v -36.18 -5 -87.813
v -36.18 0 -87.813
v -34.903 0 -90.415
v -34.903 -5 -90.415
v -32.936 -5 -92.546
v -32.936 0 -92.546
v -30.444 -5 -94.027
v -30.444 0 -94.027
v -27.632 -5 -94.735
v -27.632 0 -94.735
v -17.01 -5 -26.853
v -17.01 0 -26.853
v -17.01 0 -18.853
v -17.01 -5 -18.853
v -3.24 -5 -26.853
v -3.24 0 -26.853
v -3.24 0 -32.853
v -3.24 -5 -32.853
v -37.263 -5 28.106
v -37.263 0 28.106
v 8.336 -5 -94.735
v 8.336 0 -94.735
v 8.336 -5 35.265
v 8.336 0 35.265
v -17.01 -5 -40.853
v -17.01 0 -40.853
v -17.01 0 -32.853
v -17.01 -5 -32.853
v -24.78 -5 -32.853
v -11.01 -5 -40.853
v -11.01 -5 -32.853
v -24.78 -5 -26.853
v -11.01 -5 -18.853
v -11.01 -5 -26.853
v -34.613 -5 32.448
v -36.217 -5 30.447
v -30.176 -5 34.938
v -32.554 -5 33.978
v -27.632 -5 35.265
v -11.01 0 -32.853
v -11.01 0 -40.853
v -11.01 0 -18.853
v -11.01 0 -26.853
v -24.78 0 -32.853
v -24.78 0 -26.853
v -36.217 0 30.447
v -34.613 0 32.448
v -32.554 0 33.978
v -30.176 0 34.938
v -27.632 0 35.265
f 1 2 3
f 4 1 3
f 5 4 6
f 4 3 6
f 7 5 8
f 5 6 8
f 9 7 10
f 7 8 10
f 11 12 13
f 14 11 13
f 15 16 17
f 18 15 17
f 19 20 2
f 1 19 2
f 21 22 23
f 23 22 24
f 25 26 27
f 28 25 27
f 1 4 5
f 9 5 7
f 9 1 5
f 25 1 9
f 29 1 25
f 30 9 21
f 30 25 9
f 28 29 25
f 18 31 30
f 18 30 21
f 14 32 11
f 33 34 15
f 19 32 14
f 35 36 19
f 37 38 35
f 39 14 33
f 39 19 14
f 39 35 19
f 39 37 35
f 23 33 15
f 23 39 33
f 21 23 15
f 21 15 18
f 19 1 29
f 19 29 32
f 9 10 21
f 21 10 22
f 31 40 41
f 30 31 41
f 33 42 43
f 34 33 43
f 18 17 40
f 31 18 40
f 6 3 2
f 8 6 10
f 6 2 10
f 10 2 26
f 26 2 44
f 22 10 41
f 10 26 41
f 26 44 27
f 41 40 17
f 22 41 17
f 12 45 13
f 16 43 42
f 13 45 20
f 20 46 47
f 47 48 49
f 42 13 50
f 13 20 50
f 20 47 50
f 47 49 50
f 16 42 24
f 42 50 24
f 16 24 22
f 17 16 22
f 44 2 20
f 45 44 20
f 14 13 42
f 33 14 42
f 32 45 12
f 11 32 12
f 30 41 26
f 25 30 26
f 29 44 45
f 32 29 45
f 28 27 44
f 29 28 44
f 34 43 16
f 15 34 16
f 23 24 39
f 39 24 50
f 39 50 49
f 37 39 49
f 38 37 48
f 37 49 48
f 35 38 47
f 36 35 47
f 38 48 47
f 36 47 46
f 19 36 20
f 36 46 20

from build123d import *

# Parameters (mm, degrees)
F1_DEPTH = 5


with BuildPart() as f1:
    # F0 (on Front) → F1 (new body)
    with BuildSketch(Plane.XZ):
        with BuildLine():
            Line((8.335973, -94.735098), (8.335973, 35.264902))
            Line((8.335973, 35.264902), (-27.632447, 35.264902))
            ThreePointArc((-27.632447, 35.264902), (-33.632447, 33.279139), (-37.263132, 28.105998))
            Line((-37.263132, 28.105998), (-36.180024, -87.812574))
            ThreePointArc((-36.180024, -87.812574), (-32.936412, -92.545844), (-27.632447, -94.735098))
            Line((-27.632447, -94.735098), (8.335973, -94.735098))
        make_face()
        Polygon((-17.00996, -26.853288), (-17.00996, -18.853288), (-11.00996, -18.853288), (-11.00996, -26.853288), (-3.239573, -26.853288), (-3.239573, -32.853288), (-11.00996, -32.853288), (-11.00996, -40.853288), (-17.00996, -40.853288), (-17.00996, -32.853288), (-24.780346, -32.853288), (-24.780346, -26.853288), align=None, mode=Mode.SUBTRACT)
    extrude(amount=F1_DEPTH)


solid = f1.part
